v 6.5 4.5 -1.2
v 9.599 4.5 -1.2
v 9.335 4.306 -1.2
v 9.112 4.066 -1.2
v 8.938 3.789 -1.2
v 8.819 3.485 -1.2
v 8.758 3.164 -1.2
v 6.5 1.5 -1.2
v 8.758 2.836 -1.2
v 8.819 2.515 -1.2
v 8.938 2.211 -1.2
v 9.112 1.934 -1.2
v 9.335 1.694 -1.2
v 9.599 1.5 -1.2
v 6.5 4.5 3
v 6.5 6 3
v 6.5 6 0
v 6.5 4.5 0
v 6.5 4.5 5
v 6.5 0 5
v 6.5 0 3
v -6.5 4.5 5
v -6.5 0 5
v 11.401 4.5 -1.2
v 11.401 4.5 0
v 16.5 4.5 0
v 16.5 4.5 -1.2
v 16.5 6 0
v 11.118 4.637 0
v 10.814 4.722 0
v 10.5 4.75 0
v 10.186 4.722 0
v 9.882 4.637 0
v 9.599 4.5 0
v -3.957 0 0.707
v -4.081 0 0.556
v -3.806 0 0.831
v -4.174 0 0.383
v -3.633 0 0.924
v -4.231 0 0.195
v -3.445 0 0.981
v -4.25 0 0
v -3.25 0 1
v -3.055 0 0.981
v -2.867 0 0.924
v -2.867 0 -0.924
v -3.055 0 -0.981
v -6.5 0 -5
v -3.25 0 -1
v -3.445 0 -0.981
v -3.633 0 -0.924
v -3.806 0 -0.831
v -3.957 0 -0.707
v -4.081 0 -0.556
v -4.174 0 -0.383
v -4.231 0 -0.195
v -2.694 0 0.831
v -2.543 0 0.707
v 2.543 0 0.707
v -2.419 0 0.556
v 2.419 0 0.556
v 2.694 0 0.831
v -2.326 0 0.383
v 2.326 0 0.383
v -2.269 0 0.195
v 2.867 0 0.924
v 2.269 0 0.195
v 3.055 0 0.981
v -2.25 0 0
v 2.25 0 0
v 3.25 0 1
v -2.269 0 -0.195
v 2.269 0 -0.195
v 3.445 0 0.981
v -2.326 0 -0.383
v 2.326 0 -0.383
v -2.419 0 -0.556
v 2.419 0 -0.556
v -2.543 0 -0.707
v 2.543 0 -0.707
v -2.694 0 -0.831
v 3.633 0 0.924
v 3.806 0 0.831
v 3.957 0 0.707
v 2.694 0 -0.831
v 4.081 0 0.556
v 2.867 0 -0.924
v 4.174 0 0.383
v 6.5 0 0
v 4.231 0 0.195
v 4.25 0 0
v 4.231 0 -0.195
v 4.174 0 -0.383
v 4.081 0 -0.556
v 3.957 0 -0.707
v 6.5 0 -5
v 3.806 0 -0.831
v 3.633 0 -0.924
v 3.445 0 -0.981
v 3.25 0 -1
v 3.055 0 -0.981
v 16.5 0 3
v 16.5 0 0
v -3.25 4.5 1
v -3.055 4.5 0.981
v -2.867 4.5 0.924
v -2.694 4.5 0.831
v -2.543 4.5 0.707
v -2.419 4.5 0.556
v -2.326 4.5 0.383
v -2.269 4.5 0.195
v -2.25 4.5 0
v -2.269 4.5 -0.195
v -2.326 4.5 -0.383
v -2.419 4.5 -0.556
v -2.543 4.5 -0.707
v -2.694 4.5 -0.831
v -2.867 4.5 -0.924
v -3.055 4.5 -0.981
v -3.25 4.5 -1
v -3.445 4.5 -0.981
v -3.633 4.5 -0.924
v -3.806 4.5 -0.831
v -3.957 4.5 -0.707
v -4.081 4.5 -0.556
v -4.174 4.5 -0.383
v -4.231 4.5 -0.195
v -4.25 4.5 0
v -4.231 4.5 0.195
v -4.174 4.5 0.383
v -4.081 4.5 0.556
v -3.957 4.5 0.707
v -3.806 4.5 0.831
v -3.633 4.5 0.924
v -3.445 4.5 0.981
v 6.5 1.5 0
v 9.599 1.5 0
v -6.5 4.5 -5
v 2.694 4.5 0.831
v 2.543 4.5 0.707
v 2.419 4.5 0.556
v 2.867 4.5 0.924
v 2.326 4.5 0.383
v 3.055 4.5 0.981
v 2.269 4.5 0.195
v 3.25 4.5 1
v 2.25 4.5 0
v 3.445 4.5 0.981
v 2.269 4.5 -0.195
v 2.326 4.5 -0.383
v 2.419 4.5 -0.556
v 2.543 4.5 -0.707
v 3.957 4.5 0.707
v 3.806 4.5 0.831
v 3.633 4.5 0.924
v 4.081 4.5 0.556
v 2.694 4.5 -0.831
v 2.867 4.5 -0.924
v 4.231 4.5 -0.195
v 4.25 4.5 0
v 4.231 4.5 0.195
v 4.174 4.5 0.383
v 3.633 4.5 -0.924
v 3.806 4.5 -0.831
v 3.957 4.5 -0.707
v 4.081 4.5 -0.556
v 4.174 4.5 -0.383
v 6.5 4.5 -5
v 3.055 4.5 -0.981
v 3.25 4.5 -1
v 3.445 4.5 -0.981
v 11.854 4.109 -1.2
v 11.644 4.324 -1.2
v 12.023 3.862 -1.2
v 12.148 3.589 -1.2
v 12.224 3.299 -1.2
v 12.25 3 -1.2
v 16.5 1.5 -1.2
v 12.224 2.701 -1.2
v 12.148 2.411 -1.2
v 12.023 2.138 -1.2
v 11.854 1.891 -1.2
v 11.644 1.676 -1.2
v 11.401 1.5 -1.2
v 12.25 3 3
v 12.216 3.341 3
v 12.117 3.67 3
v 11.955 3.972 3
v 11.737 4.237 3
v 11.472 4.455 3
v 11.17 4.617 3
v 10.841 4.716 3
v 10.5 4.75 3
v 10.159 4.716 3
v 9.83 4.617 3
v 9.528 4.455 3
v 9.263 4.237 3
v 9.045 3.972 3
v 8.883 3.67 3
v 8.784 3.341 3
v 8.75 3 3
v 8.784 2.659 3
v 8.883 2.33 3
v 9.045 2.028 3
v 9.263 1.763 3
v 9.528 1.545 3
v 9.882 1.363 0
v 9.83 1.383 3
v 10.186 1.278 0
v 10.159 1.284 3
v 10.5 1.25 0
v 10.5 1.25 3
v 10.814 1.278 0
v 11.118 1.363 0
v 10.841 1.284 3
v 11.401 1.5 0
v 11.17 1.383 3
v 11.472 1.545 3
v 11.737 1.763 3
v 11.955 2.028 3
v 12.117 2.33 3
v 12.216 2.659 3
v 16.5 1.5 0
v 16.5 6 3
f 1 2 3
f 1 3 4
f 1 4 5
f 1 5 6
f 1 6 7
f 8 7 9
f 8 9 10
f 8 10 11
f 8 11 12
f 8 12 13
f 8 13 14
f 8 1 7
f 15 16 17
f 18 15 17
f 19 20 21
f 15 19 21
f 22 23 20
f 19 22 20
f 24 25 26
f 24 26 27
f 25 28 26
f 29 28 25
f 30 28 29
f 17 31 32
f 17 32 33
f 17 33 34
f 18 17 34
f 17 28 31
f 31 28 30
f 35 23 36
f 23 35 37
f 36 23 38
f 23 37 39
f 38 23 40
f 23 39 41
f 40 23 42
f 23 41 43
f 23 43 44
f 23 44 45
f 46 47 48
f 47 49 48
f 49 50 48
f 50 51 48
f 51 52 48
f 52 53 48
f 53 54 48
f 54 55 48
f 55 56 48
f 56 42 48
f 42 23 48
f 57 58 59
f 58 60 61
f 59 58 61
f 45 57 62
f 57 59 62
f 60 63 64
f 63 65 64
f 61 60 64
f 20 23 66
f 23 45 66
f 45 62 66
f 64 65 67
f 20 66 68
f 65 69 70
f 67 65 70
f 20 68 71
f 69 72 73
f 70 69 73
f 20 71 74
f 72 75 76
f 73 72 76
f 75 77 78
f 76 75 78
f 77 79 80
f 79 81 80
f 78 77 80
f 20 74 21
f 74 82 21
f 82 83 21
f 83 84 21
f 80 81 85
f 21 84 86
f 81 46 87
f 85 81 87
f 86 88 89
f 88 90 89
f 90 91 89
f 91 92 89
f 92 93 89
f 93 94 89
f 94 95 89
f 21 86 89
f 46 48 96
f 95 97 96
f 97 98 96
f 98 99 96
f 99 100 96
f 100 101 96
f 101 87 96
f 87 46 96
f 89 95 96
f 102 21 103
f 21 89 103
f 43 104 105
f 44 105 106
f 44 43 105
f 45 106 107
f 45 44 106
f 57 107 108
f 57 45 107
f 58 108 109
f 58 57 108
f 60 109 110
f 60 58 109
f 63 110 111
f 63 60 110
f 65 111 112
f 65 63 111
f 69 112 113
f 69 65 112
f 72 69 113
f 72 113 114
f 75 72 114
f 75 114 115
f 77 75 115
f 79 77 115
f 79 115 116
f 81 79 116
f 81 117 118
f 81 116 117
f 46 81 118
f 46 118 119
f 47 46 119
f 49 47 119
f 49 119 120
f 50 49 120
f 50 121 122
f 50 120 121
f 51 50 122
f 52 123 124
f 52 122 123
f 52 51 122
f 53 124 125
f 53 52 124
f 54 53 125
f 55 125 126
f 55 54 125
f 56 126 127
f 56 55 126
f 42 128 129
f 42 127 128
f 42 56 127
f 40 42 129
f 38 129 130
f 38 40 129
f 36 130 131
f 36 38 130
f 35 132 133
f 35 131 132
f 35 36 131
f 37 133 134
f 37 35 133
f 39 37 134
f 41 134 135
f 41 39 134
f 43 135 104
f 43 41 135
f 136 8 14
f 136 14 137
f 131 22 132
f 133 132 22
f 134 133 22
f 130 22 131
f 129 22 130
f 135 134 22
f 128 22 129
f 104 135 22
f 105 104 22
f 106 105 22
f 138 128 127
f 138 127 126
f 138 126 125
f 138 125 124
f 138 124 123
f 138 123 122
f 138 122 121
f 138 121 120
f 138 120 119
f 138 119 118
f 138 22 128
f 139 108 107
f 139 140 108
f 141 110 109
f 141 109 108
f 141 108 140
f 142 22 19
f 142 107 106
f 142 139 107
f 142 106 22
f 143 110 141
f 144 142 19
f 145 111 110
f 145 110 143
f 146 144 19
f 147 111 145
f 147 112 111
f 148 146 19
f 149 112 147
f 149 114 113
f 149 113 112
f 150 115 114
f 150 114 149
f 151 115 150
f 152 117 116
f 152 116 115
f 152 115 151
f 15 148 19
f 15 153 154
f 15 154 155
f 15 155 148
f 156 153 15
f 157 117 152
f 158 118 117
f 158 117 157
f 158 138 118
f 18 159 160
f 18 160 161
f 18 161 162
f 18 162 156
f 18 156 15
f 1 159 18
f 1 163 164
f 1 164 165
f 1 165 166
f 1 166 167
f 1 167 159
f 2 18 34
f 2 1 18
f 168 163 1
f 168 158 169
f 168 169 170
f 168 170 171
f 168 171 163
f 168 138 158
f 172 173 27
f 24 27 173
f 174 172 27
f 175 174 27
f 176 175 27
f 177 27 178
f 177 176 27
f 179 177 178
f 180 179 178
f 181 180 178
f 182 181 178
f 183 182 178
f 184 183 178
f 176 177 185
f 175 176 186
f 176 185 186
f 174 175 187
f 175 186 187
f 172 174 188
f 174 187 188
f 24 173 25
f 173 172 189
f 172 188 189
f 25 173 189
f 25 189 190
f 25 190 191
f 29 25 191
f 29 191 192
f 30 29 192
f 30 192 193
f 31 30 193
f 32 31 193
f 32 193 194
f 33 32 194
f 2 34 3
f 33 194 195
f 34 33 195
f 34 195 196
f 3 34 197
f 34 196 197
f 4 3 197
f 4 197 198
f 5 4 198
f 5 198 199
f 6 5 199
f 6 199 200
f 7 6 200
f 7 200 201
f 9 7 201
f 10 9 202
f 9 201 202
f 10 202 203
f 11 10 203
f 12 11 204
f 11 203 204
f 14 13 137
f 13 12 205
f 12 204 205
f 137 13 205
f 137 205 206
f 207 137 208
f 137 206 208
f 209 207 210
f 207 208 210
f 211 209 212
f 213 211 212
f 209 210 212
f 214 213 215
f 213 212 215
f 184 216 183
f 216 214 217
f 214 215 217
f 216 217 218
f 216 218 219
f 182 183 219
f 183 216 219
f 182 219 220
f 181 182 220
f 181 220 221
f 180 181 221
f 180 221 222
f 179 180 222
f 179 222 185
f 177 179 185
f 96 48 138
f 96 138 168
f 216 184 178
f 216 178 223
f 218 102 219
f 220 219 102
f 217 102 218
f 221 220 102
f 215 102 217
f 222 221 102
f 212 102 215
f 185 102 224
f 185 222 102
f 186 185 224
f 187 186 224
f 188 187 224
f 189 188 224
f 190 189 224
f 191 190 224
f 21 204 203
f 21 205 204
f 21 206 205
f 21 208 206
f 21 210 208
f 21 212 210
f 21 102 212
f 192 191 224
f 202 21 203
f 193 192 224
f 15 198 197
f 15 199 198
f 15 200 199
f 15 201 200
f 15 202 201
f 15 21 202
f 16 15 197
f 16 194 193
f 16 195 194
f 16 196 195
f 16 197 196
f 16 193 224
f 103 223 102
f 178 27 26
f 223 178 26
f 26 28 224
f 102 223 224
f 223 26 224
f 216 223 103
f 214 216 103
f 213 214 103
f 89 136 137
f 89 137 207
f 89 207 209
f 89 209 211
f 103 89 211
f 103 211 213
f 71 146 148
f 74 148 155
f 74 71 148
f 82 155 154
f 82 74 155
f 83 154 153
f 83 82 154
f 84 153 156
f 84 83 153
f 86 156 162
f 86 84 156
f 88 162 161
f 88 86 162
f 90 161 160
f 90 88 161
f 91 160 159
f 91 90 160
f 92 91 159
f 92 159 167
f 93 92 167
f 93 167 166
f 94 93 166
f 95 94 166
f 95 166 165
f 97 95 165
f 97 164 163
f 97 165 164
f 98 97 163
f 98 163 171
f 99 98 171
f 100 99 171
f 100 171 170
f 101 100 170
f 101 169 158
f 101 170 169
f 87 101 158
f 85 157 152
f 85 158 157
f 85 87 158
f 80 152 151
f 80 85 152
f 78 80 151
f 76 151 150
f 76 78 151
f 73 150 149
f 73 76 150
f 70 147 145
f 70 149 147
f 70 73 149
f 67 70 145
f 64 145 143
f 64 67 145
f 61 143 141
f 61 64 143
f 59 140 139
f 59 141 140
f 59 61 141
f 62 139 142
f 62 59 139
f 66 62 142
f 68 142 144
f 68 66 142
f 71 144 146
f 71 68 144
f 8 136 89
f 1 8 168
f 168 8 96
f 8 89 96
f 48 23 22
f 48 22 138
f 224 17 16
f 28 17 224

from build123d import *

# Parameters (mm, degrees)
SKETCH_2_W          = 13
SKETCH_2_H          = 10
SKETCH_2_R          = 1
EXTRUDE_1_DEPTH     = 6
EXTRUDE_3_DEPTH     = 10
SKETCH_5_R          = 1.75
CUT_EXTRUDE_1_DEPTH = 20.293781382
SKETCH_6_W          = 13
SKETCH_6_H          = 10
CUT_EXTRUDE_2_DEPTH = 1.5


with BuildPart() as part:
    # 草图2 → 凸台-拉伸1 (new body)
    with BuildSketch(Plane(origin=(0, 0, 0), x_dir=(1, 0, 0), z_dir=(0, 1, 0))):
        Rectangle(SKETCH_2_W, SKETCH_2_H)
        with Locations(Location((-3.25, 0, 0), (0, 0, 270))):
            Circle(SKETCH_2_R, mode=Mode.SUBTRACT)
        with Locations(Location((3.25, 0, 0), (0, 0, 270))):
            Circle(SKETCH_2_R, mode=Mode.SUBTRACT)
    extrude(amount=EXTRUDE_1_DEPTH)

    # 草图4 → 凸台-拉伸3 (add)
    with BuildSketch(Plane(origin=(6.5, 0, 11.5), x_dir=(0, 0, -1), z_dir=(1, 0, 0))):
        Polygon((11.5, 6), (11.5, 4.5), (12.7, 4.5), (12.7, 1.5), (11.5, 1.5), (11.5, 0), (8.5, 0), (8.5, 6), align=None)
    extrude(amount=EXTRUDE_3_DEPTH)

    # 草图5 → 切除-拉伸1 (cut, through all)
    with BuildSketch(Plane.XY.offset(3)):
        with Locations((10.5, 3)):
            Circle(SKETCH_5_R)
    extrude(amount=-CUT_EXTRUDE_1_DEPTH, mode=Mode.SUBTRACT)

    # 草图6 → 切除-拉伸2 (cut)
    with BuildSketch(Plane(origin=(0, 6, 0), x_dir=(1, 0, 0), z_dir=(0, 1, 0))):
        Rectangle(SKETCH_6_W, SKETCH_6_H)
    extrude(amount=-CUT_EXTRUDE_2_DEPTH, mode=Mode.SUBTRACT)


solid = part.part
